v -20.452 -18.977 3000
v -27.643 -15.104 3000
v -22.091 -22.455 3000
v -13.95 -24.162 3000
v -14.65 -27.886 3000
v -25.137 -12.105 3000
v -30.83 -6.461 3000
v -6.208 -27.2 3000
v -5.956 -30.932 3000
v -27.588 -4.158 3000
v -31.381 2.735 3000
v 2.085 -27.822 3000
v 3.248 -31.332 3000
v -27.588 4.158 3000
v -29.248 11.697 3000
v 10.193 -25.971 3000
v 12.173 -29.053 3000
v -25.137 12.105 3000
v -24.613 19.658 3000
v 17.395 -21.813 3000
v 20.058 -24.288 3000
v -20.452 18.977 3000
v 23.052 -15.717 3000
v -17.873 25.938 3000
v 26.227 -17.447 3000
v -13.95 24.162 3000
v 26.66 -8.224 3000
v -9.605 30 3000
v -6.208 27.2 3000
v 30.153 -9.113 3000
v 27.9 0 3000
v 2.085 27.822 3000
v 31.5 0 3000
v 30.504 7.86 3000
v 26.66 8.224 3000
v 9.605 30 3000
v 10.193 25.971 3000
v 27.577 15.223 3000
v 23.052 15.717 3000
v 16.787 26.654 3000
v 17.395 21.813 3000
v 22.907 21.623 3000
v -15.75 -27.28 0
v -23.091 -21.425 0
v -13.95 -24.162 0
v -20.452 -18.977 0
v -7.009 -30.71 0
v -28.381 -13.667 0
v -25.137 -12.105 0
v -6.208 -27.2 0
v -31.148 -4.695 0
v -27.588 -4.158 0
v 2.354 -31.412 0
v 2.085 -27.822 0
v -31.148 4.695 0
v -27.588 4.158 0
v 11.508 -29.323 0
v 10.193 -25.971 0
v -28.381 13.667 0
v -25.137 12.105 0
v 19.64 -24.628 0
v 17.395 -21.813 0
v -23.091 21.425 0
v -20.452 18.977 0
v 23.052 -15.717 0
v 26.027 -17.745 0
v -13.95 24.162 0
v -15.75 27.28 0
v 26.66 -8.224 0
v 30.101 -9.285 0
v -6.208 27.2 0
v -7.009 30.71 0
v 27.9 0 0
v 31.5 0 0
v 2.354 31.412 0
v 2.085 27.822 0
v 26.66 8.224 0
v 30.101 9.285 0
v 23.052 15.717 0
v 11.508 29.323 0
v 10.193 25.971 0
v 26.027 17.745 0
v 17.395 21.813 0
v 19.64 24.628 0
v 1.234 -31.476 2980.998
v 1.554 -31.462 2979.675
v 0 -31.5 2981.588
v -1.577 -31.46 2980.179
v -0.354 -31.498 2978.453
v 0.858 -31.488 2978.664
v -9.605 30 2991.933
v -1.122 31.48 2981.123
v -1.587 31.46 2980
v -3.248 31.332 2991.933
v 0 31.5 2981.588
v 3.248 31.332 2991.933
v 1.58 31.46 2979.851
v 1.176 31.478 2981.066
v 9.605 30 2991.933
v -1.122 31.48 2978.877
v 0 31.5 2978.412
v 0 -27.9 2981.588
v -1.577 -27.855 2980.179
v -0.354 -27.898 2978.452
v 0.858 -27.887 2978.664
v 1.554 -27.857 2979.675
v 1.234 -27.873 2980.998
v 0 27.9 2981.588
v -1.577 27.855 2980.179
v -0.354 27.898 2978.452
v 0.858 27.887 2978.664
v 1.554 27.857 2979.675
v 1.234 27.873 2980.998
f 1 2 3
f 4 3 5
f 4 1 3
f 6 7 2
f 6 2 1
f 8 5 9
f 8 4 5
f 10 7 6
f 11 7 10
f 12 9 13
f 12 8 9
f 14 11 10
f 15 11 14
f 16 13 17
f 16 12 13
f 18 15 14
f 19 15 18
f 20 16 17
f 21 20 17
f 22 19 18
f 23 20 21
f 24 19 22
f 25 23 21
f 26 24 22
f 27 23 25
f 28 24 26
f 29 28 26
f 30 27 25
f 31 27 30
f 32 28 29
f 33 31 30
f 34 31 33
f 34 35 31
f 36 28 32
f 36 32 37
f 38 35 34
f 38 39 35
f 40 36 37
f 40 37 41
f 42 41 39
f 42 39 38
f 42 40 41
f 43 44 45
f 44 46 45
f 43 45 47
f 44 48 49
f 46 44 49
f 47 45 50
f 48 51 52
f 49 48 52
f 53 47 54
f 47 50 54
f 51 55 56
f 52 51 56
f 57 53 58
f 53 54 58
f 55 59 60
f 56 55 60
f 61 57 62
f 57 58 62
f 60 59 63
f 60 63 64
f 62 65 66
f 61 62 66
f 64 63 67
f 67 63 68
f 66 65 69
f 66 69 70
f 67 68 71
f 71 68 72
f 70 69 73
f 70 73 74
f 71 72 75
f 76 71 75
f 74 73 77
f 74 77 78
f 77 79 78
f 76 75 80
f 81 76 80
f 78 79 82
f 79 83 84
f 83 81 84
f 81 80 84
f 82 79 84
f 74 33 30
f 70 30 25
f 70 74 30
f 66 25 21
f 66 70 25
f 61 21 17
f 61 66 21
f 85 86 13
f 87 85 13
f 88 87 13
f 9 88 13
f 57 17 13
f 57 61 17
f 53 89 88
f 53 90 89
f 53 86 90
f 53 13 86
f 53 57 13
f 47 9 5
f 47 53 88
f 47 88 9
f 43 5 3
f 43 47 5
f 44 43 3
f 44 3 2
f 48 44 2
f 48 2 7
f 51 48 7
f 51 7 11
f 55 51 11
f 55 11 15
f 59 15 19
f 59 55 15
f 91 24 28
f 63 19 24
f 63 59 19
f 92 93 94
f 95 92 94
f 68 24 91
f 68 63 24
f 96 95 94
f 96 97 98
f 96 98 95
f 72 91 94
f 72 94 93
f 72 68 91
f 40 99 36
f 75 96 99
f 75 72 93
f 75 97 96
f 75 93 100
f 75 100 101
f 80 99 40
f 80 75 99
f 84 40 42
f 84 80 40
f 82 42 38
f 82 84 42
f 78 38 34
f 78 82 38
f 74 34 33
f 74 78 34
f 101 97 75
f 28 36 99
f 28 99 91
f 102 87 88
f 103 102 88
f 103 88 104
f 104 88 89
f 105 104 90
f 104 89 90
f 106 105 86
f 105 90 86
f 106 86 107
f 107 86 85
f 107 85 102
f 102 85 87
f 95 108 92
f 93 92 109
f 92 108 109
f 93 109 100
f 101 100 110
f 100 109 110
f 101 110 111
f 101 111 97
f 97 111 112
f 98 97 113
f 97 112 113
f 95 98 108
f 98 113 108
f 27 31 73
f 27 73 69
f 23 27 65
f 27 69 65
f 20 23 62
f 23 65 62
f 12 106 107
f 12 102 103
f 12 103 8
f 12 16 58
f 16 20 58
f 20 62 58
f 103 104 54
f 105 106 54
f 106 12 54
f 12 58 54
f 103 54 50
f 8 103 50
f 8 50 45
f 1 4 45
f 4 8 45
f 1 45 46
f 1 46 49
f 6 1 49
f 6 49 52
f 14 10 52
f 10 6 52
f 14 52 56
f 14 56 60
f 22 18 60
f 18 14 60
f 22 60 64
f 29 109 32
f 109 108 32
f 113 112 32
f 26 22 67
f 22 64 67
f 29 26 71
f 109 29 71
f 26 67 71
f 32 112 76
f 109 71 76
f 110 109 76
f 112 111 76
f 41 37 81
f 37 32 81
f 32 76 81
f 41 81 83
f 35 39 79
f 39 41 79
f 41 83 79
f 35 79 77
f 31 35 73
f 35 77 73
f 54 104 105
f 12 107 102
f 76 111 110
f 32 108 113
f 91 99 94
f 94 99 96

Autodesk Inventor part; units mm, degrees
ref_plane "YZ Plane" through (0, 0, 0) normal (1, 0, 0) x (0, 1, 0)
sketch "Sketch1" plane through (0, 0, 0) normal (0, 0, 1) x (1, 0, 0)
  circle A0 centre (0, 0) radius 31.5
  circle A1 centre (0, 0) radius 27.9
  dimension "d0" = 63
  dimension "d2" = 3.6
extrude "Extrusion1" add sketch "Sketch1" along normal blind 3000
sketch "Sketch4" plane through (0, 0, 3000) normal (0, 0, 1) x (1, 0, 0)
  circle A0 centre (0, 0) radius 27.9 projected
  circle A1 centre (0, 0) radius 31.5 projected
  point P0 (0, 31.5)
ref_plane "Work Plane2" through (0, 31.5, 3000) normal (0, 1, 0) x (-1, 0, 0)
sketch "Sketch5" plane through (0, 31.5, 3000) normal (0, 1, 0) x (-1, 0, 0)
  circle A0 centre (0, -20) radius 2.0895
  line L0 (31.5, 0) -> (-31.5, 0) projected
  point P0 (0, -3000)
  dimension "d16" = 20
hole "Hole2" at (0, 31.5, 2980) direction (0, -1, 0) diameter 3.175 end through all
ref_plane "Work Plane3" through (0, 30, 0) normal (0, 1, 0) x (-1, 0, 0)
sketch "Sketch6" plane through (0, 30, 0) normal (0, 1, 0) x (-1, 0, 0)
  line L0 (-12.0739, 2991.9329) -> (13.0933, 2991.9329)
  line L1 (13.0933, 2991.9329) -> (13.0933, 3000.225)
  line L2 (13.0933, 3000.225) -> (-12.0739, 3000.225)
  line L3 (-12.0739, 3000.225) -> (-12.0739, 2991.9329)
  point P0 (0, 0)
extrude "Extrusion2" cut sketch "Sketch6" along normal blind 25.4
properties part number "2p5rss" material "PVC-Piping"
